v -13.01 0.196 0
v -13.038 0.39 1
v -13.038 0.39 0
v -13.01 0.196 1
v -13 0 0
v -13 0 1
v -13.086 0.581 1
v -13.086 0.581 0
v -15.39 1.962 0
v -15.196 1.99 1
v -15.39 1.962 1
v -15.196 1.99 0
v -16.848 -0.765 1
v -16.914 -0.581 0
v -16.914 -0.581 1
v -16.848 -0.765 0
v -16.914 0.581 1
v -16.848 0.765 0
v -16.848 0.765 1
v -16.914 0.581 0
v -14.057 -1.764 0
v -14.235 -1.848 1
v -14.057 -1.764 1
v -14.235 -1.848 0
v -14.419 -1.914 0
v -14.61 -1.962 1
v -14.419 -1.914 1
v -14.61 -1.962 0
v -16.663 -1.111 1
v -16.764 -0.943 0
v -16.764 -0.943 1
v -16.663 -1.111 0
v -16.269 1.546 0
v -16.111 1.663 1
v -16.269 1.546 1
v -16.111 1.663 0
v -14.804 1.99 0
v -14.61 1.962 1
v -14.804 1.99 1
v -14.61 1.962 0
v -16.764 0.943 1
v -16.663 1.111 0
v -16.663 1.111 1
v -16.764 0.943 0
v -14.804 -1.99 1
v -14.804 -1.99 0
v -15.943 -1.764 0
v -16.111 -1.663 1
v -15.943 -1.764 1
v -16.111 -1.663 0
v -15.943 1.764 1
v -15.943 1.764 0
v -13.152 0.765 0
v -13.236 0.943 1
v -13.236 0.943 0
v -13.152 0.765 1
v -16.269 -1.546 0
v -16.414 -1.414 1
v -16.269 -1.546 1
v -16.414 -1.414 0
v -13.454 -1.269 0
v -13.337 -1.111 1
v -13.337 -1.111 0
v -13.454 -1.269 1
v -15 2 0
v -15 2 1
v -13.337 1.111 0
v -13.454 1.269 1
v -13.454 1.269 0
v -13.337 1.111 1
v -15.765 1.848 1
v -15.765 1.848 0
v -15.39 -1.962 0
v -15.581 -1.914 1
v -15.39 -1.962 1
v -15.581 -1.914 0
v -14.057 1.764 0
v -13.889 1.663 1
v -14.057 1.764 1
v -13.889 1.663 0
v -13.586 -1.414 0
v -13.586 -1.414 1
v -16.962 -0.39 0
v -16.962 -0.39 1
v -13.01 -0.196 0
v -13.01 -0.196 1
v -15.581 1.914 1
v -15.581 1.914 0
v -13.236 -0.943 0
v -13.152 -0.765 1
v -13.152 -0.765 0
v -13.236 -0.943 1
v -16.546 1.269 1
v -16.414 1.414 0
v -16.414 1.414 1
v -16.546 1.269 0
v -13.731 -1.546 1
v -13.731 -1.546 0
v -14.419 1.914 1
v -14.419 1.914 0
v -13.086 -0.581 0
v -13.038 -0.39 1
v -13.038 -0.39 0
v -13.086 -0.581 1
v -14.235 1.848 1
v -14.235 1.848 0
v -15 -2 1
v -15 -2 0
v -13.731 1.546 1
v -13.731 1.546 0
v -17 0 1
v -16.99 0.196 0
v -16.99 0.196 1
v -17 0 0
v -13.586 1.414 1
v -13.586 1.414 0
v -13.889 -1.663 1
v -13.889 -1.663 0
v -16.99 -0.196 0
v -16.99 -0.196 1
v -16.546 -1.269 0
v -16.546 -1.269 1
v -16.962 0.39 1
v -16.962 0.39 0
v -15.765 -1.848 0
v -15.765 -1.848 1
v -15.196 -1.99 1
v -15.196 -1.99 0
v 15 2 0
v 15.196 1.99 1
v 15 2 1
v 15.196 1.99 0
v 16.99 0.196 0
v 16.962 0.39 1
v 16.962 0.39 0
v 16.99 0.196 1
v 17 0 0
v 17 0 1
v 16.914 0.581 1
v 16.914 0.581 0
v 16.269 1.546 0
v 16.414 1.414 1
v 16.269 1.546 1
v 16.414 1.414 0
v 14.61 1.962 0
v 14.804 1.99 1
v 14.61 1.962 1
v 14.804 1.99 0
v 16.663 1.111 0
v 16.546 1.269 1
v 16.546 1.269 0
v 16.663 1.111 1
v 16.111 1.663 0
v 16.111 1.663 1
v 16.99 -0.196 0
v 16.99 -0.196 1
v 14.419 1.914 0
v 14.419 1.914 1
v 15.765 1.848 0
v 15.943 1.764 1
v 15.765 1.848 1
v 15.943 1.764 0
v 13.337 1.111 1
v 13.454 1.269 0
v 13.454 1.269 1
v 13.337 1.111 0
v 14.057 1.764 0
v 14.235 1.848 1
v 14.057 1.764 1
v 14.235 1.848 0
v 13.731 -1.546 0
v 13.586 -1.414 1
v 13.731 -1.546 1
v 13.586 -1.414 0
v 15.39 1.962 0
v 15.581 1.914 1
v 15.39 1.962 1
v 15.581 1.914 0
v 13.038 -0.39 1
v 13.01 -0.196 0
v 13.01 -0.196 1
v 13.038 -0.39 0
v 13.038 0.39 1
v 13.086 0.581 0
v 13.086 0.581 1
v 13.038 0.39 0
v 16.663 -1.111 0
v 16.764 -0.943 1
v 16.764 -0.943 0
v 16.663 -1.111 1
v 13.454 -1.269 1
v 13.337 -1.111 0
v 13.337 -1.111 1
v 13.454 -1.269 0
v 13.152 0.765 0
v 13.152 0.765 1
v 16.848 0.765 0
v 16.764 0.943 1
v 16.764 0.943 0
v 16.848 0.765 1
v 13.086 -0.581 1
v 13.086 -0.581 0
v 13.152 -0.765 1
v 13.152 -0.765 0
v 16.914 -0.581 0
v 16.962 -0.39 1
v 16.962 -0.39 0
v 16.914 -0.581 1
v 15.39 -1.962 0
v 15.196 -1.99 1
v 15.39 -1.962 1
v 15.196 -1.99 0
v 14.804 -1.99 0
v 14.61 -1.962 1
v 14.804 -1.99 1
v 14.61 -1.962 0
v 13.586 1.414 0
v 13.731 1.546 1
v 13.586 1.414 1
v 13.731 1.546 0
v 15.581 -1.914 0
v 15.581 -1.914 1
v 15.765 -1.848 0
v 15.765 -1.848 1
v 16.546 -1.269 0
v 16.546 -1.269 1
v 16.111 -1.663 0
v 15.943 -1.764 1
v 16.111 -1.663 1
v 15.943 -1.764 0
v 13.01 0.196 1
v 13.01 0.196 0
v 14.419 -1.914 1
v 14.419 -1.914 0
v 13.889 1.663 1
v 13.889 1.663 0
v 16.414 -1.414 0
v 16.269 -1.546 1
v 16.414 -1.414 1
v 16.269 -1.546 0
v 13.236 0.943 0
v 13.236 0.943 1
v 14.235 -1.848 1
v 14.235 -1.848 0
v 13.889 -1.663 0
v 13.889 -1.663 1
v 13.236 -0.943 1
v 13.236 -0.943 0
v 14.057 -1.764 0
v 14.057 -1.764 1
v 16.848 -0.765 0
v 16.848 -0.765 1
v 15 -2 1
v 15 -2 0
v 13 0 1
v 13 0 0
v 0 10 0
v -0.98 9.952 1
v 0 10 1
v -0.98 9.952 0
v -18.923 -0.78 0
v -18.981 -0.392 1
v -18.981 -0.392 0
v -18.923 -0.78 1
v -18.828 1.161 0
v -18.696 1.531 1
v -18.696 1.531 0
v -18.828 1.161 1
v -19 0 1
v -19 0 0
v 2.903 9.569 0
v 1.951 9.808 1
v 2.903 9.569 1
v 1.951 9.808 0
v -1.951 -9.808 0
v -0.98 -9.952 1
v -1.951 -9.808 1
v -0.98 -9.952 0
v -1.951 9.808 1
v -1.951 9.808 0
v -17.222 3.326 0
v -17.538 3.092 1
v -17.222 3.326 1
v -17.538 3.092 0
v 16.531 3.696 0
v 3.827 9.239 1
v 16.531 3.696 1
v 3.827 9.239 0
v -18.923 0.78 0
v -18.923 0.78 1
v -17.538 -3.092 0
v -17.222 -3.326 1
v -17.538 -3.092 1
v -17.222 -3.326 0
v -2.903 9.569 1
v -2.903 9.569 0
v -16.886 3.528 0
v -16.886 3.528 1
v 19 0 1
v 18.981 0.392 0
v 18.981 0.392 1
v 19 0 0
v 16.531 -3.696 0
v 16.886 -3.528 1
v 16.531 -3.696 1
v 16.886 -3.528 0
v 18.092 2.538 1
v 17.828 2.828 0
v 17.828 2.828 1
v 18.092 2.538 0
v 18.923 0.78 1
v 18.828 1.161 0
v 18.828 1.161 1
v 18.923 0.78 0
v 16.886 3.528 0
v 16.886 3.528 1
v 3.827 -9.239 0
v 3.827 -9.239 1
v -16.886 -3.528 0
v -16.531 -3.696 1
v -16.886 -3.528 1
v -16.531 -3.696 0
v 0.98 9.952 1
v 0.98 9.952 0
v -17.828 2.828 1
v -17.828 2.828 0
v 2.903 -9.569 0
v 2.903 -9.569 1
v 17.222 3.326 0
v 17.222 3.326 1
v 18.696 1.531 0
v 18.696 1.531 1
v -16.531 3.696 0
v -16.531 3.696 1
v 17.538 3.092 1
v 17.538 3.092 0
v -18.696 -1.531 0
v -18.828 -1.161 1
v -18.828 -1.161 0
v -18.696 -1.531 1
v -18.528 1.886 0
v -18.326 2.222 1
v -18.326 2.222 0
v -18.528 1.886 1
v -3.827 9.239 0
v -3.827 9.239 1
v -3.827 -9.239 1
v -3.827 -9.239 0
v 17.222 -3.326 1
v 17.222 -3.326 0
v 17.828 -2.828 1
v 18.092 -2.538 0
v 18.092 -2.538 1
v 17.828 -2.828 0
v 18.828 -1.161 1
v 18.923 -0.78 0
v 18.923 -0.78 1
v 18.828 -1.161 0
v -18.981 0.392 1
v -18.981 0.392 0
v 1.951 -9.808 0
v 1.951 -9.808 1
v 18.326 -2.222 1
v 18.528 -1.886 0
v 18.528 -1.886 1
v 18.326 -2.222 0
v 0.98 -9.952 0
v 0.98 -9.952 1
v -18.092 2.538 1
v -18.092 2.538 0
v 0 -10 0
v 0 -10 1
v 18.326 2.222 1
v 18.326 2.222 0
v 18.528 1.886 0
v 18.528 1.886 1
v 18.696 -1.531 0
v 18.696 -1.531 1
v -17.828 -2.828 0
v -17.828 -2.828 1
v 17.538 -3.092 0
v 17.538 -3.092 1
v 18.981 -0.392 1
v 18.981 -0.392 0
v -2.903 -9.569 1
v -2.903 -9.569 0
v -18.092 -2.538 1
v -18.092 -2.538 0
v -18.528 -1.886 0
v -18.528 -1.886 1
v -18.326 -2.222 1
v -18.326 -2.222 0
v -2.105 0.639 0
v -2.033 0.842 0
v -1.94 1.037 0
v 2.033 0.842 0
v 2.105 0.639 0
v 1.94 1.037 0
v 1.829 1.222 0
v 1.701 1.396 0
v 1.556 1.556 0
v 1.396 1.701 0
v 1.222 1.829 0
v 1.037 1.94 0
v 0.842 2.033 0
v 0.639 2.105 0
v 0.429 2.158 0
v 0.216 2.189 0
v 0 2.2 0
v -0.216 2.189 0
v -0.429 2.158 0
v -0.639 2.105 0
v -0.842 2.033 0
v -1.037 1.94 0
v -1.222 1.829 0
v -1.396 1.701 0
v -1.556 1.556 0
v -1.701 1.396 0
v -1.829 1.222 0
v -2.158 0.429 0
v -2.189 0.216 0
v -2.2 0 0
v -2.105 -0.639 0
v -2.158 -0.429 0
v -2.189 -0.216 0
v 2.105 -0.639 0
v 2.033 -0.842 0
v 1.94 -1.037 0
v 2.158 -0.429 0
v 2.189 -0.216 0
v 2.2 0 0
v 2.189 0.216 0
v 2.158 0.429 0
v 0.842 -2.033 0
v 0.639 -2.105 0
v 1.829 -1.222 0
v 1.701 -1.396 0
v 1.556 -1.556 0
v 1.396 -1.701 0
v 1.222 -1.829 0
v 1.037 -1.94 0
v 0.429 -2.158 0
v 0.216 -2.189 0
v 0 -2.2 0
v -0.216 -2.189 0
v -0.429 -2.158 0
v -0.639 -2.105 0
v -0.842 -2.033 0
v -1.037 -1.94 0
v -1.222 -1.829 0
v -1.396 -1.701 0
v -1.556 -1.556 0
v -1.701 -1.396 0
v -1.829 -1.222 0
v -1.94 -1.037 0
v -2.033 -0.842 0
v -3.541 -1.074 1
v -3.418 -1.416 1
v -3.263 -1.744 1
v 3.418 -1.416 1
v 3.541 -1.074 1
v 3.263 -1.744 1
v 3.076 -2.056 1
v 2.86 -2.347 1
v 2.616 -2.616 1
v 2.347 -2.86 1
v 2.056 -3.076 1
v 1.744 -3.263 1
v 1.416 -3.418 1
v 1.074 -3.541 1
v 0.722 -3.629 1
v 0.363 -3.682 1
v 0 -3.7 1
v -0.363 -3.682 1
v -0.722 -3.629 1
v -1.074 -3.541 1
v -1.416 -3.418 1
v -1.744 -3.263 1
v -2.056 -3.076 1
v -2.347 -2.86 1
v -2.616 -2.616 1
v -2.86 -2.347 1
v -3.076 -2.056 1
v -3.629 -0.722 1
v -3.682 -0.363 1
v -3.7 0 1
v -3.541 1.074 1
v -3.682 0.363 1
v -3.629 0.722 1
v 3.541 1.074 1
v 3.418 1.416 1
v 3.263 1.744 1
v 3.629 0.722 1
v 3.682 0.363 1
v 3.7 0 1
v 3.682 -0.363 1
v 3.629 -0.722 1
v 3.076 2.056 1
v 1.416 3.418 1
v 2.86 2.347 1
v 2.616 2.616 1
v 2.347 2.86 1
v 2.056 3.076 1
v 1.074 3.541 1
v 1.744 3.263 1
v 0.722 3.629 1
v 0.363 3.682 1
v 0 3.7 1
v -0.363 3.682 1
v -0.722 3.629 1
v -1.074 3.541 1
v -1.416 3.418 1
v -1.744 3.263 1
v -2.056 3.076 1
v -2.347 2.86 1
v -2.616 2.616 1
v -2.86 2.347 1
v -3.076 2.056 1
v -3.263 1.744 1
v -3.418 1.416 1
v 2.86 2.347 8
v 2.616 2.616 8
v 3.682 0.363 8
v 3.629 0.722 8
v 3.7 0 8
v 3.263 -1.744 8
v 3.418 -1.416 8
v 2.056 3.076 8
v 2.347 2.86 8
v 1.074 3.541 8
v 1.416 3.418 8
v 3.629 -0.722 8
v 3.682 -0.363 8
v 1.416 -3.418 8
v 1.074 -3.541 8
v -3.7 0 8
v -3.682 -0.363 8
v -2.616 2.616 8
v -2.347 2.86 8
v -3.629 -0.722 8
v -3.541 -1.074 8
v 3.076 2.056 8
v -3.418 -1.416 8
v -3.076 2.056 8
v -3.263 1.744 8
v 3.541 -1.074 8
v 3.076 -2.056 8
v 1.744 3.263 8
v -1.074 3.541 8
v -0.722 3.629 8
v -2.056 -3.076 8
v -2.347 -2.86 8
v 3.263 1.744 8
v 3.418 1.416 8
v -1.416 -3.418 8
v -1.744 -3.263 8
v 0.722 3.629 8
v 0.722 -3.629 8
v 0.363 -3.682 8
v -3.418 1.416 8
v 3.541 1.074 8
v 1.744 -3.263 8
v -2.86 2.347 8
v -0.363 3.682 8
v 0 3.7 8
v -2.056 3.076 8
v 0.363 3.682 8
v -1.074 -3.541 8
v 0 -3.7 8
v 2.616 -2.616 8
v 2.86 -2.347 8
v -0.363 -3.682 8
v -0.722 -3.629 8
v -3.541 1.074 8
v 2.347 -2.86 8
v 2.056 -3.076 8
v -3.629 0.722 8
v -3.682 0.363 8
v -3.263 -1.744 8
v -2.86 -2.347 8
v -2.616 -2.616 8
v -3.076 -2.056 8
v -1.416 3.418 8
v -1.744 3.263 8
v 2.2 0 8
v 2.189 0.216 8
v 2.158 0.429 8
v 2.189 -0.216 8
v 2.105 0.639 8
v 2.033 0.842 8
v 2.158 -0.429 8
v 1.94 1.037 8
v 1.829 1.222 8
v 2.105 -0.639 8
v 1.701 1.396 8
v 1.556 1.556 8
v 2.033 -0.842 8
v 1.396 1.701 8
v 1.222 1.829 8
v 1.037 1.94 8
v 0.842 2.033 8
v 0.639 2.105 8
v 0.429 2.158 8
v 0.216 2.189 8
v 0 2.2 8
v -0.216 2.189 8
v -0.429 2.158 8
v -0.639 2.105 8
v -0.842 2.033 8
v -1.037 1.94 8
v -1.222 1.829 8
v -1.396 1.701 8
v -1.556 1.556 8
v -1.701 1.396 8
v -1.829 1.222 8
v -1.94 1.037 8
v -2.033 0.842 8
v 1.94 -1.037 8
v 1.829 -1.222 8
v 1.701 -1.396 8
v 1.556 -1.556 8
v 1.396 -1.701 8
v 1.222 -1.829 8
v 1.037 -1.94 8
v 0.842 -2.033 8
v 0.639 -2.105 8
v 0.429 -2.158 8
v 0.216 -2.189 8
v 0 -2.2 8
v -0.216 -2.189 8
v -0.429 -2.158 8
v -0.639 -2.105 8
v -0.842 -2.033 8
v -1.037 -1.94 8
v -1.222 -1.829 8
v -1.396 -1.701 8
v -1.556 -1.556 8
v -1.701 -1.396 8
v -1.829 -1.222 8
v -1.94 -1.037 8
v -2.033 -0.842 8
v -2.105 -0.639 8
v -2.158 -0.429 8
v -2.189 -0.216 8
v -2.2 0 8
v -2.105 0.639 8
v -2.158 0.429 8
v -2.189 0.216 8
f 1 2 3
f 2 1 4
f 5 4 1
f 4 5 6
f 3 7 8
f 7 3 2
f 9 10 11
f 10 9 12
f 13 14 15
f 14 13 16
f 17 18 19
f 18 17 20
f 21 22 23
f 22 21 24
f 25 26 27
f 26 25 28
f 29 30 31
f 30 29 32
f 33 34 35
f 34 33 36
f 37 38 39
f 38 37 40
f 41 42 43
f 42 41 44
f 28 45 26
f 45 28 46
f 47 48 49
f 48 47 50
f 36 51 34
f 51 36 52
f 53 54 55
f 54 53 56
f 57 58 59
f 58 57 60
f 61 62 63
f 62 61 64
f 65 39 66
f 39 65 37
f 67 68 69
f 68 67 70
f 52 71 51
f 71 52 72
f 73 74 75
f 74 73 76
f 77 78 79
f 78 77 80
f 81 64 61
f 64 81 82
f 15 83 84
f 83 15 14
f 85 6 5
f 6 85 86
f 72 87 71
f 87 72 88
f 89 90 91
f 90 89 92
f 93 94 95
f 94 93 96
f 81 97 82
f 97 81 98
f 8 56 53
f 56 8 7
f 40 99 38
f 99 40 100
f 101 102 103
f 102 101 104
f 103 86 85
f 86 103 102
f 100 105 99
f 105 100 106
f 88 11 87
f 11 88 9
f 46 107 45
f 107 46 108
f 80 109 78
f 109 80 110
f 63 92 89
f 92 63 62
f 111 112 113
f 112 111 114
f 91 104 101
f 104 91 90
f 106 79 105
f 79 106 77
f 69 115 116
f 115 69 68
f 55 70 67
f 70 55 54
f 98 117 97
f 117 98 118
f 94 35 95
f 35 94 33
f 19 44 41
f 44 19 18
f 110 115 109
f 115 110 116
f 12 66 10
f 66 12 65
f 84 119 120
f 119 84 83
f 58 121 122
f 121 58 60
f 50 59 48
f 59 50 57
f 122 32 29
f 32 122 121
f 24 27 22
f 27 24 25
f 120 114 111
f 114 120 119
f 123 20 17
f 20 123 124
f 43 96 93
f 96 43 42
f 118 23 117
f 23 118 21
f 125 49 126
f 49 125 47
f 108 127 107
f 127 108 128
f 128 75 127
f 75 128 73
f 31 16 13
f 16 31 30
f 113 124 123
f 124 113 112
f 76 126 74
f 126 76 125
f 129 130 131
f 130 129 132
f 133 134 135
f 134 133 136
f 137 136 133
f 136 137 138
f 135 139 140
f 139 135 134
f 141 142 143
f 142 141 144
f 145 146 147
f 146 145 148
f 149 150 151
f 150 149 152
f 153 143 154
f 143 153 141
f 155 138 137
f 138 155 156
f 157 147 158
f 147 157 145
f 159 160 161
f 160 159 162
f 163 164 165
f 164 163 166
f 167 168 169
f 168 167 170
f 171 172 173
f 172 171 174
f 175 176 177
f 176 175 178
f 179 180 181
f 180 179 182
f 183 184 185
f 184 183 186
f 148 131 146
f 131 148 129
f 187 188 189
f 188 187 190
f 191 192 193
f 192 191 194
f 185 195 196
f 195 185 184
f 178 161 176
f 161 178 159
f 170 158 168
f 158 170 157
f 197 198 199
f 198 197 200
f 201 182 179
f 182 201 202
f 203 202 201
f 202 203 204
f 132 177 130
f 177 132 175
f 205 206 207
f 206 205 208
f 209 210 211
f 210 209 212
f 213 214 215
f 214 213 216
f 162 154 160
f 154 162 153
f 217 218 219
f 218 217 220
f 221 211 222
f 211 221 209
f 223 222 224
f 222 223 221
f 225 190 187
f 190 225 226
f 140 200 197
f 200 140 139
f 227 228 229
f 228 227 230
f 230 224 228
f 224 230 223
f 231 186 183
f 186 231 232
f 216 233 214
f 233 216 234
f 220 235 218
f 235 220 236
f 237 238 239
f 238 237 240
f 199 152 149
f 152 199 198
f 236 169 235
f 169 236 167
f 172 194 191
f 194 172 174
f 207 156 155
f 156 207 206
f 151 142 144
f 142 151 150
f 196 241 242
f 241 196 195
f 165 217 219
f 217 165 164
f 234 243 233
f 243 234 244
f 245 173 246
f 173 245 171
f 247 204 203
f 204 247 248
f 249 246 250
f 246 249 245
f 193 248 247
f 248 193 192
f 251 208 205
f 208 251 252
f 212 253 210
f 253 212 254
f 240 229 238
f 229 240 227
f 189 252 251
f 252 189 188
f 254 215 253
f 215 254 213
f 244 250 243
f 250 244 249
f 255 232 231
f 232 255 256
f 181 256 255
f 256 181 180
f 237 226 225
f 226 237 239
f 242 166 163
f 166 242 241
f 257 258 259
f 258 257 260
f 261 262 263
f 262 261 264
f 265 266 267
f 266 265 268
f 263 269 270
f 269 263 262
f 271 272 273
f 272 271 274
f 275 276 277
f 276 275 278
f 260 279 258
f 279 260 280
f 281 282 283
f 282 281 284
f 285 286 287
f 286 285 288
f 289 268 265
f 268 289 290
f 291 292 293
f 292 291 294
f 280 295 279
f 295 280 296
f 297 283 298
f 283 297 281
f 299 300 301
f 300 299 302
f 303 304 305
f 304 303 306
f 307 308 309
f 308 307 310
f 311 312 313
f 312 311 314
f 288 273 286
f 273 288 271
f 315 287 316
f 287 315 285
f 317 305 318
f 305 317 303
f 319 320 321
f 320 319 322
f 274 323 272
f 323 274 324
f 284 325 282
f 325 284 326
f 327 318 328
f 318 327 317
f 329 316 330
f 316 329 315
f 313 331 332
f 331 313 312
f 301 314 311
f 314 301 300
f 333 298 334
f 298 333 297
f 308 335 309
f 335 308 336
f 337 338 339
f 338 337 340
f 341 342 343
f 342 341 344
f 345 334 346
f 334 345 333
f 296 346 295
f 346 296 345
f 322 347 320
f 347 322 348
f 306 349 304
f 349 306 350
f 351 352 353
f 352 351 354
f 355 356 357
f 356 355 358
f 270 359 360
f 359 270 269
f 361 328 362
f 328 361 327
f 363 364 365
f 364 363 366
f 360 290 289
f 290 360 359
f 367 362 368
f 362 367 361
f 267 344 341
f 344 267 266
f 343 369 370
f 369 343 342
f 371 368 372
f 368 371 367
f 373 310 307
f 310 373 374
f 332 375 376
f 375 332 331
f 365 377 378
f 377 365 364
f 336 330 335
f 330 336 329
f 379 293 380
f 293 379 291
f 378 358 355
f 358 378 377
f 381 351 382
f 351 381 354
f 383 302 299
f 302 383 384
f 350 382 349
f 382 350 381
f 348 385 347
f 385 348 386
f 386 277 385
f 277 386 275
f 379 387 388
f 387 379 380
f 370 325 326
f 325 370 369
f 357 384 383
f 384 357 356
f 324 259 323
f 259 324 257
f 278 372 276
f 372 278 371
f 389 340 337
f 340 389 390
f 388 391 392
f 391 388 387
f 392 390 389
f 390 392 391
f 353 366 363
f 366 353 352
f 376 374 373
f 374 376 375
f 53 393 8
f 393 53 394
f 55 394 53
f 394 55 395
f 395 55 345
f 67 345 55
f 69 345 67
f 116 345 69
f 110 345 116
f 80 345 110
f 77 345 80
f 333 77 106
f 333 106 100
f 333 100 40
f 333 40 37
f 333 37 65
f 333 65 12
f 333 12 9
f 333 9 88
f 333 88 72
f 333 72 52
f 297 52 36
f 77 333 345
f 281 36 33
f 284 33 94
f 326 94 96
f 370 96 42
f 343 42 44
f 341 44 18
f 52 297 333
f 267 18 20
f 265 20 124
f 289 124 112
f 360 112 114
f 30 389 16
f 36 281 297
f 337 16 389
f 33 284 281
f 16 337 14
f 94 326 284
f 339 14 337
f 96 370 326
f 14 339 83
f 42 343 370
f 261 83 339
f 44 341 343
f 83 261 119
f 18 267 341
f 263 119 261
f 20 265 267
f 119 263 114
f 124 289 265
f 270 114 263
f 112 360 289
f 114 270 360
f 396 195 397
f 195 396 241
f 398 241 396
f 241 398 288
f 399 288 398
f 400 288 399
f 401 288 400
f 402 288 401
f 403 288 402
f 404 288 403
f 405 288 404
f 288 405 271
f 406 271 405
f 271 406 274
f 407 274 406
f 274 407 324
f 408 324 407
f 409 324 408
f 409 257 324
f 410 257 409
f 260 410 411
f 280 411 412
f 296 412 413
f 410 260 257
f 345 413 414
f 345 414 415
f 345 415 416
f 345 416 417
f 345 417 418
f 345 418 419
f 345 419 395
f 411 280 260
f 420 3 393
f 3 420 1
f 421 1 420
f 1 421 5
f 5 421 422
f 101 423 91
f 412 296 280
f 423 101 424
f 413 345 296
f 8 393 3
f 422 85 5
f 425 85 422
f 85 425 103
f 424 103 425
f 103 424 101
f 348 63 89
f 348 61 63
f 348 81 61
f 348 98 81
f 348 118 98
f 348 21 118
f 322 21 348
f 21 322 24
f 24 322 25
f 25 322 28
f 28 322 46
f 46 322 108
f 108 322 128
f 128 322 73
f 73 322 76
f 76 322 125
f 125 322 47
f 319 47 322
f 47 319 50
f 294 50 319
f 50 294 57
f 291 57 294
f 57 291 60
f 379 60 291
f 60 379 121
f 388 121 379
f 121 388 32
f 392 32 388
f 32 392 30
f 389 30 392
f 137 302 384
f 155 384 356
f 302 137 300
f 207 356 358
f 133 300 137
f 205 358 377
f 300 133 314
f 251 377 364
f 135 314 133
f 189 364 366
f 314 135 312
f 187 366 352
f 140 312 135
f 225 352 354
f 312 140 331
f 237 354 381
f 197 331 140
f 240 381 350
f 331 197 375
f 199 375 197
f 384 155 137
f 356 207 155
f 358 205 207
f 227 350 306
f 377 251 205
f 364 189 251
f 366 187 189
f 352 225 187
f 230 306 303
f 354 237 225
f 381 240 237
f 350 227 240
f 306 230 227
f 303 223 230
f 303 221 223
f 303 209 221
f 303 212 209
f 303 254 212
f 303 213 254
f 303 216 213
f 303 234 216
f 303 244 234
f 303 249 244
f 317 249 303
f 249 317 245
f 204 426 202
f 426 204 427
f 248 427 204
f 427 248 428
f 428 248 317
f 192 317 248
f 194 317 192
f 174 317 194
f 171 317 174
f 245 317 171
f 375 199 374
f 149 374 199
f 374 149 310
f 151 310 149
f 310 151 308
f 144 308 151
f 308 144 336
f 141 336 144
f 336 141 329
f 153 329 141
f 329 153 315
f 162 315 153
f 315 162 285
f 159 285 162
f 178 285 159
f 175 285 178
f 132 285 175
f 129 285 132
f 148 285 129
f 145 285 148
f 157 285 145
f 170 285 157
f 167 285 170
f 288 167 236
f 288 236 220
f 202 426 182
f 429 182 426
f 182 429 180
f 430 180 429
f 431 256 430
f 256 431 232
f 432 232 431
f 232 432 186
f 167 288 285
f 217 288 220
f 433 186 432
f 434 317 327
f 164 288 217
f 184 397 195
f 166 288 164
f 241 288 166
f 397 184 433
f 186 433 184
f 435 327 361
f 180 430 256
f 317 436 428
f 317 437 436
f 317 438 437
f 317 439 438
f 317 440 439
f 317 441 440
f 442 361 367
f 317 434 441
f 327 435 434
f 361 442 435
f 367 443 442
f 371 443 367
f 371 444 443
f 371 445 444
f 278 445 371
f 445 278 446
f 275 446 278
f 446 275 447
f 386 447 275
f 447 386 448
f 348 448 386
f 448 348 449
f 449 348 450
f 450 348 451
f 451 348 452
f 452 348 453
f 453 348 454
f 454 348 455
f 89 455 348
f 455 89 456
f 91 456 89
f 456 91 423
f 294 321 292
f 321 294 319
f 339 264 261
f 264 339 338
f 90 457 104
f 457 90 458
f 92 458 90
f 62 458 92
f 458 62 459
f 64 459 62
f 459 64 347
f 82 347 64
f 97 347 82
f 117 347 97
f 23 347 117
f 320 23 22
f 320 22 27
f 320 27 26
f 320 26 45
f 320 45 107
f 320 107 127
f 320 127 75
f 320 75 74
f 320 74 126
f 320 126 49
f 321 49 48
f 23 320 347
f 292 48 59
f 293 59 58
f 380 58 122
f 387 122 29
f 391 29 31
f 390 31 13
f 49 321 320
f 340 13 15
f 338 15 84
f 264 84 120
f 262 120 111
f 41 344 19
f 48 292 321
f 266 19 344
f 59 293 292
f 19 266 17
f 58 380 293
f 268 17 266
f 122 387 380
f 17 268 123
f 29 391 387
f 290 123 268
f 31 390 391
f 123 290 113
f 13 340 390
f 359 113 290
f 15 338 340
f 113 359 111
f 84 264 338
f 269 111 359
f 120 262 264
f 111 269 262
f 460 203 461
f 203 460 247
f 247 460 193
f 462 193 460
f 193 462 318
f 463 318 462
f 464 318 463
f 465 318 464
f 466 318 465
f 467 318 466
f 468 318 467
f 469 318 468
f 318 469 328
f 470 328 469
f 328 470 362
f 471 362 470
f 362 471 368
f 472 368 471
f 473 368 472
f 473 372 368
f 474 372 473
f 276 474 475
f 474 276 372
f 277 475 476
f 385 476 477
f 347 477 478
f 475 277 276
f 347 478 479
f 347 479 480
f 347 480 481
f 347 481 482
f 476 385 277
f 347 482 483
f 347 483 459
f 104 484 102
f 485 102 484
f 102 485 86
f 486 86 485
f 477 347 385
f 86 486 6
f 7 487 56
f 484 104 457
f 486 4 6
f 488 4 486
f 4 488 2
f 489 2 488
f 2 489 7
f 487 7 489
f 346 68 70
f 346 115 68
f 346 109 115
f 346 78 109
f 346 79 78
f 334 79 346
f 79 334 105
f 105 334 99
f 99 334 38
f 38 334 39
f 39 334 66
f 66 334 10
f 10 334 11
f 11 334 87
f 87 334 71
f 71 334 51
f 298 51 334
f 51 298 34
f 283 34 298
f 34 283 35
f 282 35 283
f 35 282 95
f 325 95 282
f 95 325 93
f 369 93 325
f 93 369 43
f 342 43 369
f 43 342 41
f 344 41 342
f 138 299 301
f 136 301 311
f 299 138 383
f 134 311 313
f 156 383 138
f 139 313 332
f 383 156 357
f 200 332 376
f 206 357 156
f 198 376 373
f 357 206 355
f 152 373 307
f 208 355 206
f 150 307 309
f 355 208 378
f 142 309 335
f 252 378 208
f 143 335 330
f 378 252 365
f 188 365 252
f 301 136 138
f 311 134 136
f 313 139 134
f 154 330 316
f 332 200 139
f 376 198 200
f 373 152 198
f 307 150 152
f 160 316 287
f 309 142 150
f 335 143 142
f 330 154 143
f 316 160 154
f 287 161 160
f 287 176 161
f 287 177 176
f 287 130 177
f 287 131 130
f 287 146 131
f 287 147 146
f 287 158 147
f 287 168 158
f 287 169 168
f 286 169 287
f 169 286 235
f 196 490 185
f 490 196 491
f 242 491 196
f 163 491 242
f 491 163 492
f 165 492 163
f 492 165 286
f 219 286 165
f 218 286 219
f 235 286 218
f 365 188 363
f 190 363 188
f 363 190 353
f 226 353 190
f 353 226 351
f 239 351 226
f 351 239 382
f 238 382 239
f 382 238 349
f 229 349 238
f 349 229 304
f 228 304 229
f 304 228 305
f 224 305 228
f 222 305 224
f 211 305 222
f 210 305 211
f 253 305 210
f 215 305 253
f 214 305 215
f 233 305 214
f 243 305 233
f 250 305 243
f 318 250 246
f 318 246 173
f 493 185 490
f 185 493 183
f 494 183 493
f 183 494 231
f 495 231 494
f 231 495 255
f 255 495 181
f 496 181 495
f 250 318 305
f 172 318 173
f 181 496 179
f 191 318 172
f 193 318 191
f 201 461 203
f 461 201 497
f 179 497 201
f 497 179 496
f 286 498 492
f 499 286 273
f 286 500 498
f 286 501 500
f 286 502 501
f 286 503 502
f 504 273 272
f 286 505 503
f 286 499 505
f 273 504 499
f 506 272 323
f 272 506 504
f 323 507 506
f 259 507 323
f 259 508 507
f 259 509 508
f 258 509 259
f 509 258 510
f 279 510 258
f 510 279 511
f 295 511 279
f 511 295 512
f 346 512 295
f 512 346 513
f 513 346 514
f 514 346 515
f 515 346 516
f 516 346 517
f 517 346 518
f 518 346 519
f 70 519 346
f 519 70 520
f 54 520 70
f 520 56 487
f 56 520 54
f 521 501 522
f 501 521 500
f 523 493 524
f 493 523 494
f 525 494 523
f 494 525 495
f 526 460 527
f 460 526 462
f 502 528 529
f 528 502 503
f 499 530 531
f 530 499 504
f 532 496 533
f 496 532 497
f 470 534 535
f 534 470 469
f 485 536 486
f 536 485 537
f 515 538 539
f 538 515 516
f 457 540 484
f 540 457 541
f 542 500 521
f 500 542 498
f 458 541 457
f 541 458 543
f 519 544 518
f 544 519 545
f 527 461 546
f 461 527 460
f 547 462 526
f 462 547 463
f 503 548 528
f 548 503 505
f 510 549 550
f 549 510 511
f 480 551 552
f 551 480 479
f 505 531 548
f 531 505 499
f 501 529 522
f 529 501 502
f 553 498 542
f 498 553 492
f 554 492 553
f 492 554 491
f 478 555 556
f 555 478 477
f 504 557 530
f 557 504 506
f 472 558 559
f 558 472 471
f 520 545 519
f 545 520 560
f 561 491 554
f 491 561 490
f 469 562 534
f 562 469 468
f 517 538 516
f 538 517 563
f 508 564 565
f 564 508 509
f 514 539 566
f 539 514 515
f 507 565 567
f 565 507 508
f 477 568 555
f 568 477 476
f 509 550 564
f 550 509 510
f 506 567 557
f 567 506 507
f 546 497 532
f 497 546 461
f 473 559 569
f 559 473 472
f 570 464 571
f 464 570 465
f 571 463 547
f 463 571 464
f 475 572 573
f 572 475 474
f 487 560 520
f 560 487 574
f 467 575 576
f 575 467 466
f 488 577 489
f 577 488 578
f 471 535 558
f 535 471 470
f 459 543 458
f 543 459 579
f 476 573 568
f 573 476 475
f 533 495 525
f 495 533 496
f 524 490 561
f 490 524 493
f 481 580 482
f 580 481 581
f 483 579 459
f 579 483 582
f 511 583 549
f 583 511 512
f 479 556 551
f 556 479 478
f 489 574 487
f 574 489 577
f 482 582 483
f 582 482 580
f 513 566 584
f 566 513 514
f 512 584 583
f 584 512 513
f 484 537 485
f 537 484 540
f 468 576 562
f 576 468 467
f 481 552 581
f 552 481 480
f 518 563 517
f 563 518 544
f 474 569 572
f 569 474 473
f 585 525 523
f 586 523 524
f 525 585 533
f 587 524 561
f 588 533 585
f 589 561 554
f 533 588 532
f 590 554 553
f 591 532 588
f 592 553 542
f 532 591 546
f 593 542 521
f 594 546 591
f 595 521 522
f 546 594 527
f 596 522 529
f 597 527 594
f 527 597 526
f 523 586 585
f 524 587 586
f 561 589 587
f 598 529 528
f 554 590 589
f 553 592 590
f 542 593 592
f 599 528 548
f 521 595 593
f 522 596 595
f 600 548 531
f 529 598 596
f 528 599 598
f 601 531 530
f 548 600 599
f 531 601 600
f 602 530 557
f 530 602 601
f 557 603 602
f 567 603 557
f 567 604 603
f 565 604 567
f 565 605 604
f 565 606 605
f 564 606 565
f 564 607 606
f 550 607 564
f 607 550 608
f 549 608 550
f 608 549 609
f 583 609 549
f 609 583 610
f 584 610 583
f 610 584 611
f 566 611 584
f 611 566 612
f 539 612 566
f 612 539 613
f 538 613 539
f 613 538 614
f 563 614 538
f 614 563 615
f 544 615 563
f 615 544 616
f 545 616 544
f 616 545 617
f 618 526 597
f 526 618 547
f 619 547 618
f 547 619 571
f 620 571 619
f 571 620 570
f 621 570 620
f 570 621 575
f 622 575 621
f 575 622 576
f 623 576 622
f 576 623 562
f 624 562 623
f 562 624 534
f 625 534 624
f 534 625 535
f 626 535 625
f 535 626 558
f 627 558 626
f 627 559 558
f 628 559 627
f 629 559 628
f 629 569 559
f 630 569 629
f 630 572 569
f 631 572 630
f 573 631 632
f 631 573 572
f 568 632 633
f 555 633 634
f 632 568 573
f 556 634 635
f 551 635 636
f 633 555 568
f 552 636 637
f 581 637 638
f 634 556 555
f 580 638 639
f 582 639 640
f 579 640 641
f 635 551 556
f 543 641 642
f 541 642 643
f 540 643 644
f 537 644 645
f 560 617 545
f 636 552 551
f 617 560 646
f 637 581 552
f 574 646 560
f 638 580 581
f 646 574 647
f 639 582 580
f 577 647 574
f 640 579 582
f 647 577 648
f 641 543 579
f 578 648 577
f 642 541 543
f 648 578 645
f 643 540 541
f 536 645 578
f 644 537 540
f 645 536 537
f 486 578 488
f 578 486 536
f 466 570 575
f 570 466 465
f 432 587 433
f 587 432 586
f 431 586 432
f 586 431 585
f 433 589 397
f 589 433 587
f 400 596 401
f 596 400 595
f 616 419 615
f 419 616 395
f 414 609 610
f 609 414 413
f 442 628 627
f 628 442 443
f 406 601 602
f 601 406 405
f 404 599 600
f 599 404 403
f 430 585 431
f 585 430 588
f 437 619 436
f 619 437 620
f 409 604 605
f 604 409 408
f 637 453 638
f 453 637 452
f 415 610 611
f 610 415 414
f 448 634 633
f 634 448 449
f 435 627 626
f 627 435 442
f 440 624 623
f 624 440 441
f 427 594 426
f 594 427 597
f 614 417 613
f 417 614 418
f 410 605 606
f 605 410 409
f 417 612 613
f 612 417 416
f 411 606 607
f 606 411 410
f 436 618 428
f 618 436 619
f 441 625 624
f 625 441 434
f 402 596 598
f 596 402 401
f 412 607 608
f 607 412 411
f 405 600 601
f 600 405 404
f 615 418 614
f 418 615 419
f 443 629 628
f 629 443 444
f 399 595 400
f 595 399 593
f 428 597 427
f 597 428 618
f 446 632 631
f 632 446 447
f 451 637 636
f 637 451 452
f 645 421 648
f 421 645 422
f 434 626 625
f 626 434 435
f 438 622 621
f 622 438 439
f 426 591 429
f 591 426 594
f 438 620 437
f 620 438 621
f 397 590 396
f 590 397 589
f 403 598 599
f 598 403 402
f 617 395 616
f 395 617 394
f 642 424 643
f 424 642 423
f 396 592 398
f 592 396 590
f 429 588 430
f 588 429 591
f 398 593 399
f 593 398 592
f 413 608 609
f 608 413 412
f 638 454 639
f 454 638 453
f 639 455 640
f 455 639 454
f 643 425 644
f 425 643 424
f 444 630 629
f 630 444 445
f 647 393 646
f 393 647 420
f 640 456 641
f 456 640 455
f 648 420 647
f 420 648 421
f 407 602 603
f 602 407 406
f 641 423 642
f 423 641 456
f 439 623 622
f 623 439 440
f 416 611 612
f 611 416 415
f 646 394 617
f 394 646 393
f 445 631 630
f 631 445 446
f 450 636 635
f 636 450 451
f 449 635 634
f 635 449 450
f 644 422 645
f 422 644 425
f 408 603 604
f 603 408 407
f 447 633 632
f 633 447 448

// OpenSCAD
/* BandMate Project, pickup.scad
 * pickup.scad by Oskari Rundgren is licensed under the
 * Creative Commons Attribution-ShareAlike 4.0 International License.
 */

$fn = 64;

p_height = 8; // Height without magnet. Top piece adds 1mm. 
m_height = 10;  // Height of magnet. Just for show. 
m_radius = 2; // Radius of magnet hole. 
p_mult = 1.1; // Hole size multiplier. For fixing printer size errors. 
s_radius = 2; // Radius of screw hole.  
s_dist = 30; // Distance of screw hole to hole. 
b_radius = 10; // Radius of bottom plate. 

pickup();

module pickup()
{	
	/* Magnet. */
	%cylinder(r=m_radius,h=m_height);

	/* Assembly. */
	difference()
	{
		union()
		{
			pickup_bottom(); // Bottom plate. 
			cylinder(r=m_radius*p_mult+1.5,h=p_height); // Bobbin. 
		}
		cylinder(r=m_radius*p_mult,h=20); // Middle hole. 
	}


	/* Bottom plate. */
	module pickup_bottom()
	{
		difference()
		{
			linear_extrude(height=1)
			hull()
			{
				translate([-s_dist/2,0,0]) circle(r=s_radius+2);
				circle(r=b_radius); 
				translate([s_dist/2,0,0]) circle(r=s_radius+2);
			}
			union() // Screw holes. 
			{
				translate([-s_dist/2,0,0]) cylinder(r=s_radius,h=10,center=true);
				translate([s_dist/2,0,0]) cylinder(r=s_radius,h=10,center=true);
			}
		}
	}
}
